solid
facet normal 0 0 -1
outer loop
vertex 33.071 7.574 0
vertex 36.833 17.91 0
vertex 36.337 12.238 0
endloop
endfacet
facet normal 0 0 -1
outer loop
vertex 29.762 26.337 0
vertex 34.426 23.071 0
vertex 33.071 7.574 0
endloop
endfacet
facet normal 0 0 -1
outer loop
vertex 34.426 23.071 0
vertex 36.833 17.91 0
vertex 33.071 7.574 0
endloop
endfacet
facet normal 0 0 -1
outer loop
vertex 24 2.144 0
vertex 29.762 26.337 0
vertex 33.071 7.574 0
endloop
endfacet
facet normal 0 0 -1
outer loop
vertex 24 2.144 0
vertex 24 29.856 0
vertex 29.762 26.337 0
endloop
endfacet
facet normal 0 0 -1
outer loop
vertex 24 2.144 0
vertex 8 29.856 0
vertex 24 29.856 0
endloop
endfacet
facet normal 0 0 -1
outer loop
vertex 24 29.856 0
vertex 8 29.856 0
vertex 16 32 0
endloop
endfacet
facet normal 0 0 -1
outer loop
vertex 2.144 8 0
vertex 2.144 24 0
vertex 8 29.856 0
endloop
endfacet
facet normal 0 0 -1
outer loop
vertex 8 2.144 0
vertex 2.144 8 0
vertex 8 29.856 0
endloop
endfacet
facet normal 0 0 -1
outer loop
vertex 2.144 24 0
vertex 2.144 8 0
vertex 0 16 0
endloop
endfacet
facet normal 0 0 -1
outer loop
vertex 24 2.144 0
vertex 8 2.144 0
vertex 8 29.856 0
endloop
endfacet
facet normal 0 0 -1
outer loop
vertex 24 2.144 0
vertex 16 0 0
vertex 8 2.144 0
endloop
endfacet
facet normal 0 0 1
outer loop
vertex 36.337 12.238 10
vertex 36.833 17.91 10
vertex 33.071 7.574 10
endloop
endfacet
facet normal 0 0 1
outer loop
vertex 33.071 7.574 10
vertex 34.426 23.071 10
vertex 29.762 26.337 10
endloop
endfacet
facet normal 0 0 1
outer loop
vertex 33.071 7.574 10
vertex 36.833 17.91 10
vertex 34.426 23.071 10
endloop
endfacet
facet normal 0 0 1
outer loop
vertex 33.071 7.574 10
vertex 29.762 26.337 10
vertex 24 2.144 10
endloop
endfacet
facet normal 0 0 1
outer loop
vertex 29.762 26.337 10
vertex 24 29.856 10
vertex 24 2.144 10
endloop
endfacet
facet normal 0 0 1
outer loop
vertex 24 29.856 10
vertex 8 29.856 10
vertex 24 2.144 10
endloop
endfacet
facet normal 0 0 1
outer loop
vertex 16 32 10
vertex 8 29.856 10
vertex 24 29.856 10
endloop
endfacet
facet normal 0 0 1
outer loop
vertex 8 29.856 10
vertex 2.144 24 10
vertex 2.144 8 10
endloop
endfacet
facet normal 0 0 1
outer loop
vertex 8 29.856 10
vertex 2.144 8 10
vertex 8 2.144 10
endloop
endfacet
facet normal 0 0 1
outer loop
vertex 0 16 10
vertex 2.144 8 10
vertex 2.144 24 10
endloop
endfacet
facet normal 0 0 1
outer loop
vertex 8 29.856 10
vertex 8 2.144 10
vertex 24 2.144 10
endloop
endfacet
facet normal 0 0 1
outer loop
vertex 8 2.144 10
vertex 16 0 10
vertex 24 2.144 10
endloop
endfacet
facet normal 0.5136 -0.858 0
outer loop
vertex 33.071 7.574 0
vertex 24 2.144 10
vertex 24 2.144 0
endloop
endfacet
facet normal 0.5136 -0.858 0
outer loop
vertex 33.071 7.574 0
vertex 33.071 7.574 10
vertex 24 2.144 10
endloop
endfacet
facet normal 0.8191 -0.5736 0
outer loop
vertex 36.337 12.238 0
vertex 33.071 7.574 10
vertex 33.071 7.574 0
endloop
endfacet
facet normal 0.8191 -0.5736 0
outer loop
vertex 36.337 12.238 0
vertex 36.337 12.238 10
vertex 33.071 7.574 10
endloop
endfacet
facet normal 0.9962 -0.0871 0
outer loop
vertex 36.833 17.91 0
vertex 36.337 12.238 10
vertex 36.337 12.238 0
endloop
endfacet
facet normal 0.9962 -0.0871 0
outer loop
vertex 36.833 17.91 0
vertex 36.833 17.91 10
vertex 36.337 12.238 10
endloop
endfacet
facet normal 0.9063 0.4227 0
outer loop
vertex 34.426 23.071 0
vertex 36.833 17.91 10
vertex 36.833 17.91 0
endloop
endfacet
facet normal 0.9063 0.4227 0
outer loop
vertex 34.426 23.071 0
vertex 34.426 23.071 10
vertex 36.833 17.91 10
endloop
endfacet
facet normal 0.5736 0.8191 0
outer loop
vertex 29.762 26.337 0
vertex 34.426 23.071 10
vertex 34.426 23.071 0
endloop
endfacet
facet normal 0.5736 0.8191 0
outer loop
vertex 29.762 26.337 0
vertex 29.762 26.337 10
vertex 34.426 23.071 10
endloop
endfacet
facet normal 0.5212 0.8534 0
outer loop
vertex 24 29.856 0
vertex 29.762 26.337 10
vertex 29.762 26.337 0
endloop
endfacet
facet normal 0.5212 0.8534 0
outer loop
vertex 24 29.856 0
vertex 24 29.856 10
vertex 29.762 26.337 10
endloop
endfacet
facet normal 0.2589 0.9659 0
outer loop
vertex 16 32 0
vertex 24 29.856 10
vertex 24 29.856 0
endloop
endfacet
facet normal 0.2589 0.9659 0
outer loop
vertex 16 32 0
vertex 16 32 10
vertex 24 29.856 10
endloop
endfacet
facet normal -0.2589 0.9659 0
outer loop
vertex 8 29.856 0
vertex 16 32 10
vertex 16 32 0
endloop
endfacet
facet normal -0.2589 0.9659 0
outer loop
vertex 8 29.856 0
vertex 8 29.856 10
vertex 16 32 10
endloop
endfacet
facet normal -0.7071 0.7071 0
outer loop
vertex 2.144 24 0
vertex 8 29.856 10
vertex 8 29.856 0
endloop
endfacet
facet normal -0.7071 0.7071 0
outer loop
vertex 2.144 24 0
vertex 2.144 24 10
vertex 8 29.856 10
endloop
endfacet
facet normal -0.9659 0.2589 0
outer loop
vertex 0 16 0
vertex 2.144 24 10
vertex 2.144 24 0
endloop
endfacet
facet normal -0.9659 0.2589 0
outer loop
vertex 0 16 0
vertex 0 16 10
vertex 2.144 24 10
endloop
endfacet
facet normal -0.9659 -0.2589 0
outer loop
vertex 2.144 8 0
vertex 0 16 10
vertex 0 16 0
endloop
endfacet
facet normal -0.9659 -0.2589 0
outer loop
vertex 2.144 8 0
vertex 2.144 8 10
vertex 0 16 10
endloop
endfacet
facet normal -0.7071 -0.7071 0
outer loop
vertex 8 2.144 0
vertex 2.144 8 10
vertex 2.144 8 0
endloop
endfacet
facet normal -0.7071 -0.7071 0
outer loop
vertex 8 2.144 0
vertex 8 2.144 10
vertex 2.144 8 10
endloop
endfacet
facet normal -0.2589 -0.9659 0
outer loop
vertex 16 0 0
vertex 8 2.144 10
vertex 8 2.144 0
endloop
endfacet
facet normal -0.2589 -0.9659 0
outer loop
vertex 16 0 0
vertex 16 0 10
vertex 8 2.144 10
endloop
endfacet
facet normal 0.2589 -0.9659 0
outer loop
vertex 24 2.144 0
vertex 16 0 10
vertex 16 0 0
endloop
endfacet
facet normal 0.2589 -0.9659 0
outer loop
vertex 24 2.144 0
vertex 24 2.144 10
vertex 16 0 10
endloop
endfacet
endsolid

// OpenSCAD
$fn = 32;

// ----------------------------------------------------------------------
// Eccentric disc: step, 10 mm thick
// ----------------------------------------------------------------------

// --- parameters (mm) ---
profile_height = 10;      // extrusion height
profile_points = 14;      // points of the closed outline

profile = [[0, 16], [2.144, 8], [8, 2.144], [16, 0], [24, 2.144], [33.071, 7.574], [36.337, 12.238], [36.833, 17.91], [34.426, 23.071], [29.762, 26.337], [24, 29.856], [16, 32], [8, 29.856], [2.144, 24]];  // single closed polygon, 14 points, counter clockwise

// --- the one profile operation ---
linear_extrude(height = profile_height) polygon(points = profile);
